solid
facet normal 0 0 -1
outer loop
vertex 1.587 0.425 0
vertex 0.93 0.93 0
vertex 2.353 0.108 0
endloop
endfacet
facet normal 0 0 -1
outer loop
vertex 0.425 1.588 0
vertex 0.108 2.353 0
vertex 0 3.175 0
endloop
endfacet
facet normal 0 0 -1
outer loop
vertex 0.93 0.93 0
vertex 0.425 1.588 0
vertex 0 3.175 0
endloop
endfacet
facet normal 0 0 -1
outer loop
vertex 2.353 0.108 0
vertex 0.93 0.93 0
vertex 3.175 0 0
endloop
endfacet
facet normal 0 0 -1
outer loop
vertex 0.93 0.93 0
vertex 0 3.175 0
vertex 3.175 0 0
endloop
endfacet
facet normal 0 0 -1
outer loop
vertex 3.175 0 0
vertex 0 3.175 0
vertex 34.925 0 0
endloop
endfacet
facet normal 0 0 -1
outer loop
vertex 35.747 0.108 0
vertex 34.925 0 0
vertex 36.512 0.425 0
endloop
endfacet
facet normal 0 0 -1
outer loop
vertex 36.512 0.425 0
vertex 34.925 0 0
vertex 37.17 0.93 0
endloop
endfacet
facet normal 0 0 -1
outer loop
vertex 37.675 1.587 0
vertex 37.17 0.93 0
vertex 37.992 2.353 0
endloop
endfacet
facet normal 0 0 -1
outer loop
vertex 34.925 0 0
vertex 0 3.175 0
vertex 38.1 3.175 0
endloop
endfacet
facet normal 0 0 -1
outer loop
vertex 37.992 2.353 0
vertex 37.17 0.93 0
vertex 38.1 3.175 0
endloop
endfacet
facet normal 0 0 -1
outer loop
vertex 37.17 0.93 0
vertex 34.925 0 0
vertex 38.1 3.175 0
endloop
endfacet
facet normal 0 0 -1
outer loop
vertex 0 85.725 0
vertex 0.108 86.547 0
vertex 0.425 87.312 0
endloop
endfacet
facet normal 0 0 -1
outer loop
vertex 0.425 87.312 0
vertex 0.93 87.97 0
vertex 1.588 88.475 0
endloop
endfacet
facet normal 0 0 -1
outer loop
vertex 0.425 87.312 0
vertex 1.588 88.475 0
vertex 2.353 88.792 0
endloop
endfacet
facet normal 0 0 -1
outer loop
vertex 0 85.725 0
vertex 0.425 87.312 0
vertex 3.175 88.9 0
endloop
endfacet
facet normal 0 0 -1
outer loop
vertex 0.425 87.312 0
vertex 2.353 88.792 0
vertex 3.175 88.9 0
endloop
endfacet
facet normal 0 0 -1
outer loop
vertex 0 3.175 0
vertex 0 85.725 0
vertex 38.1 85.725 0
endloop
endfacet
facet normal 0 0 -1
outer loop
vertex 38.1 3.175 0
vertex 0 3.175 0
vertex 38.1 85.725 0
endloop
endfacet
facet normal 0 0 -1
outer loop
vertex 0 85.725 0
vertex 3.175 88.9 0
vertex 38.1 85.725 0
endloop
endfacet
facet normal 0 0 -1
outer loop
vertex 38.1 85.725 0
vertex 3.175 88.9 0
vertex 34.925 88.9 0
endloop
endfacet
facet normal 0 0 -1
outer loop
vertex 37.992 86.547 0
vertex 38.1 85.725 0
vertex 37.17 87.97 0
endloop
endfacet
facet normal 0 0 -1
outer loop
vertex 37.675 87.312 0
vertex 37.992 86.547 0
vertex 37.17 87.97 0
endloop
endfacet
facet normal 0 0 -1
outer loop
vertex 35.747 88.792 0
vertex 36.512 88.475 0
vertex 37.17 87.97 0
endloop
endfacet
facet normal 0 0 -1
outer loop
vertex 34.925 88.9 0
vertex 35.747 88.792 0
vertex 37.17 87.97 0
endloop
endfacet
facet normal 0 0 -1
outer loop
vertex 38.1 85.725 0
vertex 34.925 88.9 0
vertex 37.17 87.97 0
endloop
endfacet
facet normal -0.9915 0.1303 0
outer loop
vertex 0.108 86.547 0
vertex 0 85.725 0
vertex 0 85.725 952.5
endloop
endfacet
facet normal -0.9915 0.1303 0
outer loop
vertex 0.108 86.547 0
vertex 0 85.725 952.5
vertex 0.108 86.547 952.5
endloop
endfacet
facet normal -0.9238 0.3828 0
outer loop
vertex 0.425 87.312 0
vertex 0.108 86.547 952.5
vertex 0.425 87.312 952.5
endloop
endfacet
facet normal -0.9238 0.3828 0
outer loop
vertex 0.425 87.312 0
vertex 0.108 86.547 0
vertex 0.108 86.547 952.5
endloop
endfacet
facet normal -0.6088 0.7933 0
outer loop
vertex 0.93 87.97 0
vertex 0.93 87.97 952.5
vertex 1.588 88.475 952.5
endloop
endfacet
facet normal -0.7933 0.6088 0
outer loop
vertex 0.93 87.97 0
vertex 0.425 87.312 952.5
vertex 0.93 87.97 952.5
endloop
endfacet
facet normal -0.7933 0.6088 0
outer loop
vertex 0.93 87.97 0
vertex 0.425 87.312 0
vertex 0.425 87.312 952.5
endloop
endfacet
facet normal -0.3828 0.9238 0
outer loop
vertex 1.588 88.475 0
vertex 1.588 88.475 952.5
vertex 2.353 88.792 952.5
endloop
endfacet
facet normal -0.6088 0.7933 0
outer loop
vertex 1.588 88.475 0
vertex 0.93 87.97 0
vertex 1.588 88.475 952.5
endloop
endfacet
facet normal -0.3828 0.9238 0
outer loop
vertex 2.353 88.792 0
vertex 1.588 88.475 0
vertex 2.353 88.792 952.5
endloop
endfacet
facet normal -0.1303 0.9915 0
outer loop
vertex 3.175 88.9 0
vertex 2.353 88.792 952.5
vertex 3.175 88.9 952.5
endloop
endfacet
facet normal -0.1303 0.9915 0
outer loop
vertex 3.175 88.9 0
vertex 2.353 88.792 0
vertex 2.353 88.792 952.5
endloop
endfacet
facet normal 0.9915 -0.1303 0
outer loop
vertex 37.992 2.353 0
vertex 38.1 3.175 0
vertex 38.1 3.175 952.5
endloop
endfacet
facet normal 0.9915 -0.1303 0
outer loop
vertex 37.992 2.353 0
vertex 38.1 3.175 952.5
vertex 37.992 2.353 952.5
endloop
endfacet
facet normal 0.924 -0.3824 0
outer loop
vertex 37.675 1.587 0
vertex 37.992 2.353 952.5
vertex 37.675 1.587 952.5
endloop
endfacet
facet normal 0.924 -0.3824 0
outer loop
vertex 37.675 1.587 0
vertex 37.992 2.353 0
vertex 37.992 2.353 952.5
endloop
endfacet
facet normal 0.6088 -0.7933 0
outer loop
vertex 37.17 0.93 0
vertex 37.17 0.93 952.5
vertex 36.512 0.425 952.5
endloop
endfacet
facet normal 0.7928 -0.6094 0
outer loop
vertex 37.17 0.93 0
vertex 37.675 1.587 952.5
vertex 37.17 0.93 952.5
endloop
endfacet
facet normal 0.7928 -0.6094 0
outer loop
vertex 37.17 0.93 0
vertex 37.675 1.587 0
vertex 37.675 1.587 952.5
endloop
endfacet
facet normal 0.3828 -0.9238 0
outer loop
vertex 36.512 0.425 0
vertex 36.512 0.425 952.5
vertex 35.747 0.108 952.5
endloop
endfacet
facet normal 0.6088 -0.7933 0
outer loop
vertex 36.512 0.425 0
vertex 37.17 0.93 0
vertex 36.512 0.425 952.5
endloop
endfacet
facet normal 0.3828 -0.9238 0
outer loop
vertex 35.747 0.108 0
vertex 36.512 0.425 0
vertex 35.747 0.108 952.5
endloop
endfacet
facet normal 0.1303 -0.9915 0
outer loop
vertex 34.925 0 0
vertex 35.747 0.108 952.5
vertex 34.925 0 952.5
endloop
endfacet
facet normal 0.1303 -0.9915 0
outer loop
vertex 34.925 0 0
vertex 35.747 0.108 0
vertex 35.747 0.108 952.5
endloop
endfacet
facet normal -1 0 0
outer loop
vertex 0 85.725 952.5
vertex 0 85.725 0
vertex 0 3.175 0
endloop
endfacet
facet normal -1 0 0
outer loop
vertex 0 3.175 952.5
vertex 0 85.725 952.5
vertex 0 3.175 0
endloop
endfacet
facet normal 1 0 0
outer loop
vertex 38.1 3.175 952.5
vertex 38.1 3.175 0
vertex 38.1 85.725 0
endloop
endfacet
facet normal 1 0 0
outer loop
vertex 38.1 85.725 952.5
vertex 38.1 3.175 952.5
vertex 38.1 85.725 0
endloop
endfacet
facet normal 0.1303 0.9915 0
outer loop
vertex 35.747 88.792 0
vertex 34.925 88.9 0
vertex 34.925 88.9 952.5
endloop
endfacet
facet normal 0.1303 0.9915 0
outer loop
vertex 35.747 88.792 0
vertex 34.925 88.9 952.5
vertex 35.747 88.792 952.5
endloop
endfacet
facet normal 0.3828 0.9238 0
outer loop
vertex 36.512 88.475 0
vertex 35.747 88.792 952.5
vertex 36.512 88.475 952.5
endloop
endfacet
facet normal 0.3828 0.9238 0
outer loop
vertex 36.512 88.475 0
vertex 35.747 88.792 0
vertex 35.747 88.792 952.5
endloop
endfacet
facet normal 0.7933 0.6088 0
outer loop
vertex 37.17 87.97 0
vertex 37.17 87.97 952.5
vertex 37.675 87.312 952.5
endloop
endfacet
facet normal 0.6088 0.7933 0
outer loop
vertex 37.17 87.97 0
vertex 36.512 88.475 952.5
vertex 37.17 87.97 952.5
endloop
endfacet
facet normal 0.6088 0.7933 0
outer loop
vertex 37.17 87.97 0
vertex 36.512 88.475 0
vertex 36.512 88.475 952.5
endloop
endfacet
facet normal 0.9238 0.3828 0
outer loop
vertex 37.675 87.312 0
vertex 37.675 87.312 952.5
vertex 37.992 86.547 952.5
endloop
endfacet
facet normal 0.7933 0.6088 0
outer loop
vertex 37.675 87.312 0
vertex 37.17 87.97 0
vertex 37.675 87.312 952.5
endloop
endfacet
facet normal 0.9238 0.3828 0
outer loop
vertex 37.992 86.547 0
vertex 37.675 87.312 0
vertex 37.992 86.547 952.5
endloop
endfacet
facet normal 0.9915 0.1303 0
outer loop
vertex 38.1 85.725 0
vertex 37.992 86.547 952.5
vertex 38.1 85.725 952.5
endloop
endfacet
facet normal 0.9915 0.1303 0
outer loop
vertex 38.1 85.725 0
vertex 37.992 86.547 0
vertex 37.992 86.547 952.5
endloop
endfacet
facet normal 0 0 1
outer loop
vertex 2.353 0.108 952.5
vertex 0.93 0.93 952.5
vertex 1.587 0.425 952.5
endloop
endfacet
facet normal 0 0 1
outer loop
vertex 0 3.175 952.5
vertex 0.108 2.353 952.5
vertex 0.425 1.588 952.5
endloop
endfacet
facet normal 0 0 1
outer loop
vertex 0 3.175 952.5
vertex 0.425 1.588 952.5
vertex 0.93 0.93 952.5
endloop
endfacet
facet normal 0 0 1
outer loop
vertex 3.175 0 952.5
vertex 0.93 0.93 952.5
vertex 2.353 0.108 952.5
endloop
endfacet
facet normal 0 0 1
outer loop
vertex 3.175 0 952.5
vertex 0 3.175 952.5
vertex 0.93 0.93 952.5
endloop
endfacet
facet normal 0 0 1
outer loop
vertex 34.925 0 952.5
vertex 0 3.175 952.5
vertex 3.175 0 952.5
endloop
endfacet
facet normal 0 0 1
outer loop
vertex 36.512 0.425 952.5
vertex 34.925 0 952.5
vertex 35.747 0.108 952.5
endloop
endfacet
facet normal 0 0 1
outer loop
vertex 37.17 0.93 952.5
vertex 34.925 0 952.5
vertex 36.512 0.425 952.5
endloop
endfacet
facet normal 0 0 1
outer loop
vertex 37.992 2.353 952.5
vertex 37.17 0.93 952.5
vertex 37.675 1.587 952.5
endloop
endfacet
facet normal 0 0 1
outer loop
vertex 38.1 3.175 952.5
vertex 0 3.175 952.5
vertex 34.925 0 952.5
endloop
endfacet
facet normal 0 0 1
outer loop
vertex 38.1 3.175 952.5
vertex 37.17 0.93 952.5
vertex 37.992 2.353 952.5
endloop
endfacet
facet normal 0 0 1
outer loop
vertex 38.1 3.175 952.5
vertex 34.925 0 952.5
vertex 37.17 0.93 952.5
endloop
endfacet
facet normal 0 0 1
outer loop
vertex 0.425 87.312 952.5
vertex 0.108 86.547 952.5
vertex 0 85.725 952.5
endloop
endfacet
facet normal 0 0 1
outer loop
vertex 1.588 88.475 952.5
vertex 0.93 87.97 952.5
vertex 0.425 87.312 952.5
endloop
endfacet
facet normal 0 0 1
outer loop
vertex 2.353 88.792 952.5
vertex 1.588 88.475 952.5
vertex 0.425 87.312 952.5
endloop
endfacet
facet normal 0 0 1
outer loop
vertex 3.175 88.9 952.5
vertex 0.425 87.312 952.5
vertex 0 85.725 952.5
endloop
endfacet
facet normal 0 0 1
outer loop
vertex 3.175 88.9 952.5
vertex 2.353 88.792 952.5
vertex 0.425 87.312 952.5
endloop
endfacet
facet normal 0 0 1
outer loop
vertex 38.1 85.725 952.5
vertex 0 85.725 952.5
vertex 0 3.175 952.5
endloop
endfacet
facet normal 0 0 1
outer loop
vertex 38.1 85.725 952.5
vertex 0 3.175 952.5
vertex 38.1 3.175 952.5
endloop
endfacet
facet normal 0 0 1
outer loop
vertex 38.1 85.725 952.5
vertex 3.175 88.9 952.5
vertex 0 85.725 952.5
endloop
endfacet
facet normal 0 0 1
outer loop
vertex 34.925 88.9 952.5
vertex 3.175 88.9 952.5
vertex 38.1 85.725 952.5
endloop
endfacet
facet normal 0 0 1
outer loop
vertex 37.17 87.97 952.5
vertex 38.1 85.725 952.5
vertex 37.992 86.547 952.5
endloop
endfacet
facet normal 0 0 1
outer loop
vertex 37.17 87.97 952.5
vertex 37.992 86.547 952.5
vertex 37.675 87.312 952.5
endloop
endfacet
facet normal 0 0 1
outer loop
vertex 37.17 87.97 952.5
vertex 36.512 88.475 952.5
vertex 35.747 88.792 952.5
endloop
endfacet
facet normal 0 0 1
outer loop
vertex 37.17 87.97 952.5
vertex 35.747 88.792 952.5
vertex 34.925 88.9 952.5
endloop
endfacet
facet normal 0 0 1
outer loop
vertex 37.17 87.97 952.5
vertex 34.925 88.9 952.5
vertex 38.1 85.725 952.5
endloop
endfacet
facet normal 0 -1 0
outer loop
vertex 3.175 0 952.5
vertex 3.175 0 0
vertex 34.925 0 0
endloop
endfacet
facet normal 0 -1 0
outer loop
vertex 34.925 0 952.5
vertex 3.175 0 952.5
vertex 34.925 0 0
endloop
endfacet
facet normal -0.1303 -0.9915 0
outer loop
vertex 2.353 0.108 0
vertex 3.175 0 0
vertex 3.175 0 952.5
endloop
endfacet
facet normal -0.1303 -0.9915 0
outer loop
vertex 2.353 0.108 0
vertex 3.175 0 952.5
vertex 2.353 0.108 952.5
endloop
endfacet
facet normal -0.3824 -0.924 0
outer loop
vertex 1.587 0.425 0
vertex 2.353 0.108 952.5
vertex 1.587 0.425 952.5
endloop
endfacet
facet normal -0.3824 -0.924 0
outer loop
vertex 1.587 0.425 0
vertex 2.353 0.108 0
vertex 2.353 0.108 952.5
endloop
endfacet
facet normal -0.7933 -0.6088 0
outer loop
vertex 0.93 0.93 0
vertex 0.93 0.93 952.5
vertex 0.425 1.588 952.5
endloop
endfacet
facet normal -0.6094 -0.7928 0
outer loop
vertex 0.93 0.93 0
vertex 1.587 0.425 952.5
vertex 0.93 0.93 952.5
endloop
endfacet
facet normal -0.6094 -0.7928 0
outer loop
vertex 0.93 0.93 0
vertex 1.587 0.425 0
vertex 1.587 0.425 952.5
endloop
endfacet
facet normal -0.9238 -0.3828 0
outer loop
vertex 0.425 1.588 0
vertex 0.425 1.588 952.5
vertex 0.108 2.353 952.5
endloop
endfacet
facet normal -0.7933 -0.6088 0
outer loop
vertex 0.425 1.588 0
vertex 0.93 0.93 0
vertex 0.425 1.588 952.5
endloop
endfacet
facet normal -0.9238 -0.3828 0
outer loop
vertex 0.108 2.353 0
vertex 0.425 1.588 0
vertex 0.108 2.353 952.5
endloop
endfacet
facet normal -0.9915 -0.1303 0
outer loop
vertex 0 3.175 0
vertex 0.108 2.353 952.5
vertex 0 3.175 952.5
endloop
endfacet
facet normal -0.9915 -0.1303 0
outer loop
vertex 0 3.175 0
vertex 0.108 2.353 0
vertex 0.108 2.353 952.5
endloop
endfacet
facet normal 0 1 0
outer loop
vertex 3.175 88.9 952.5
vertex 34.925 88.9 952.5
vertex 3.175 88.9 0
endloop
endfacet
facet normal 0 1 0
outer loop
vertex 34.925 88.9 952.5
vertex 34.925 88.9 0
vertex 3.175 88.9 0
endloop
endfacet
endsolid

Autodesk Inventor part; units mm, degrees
ref_plane "YZ Plane" through (0, 0, 0) normal (1, 0, 0) x (0, 1, 0)
ref_plane "XZ Plane" through (0, 0, 0) normal (0, 1, 0) x (-1, 0, 0)
ref_plane "XY Plane" through (0, 0, 0) normal (0, 0, 1) x (1, 0, 0)
sketch "Sketch1" plane through (0, 0, 0) normal (0, 0, 1) x (1, 0, 0)
  line L0 (3.175, 0) -> (34.925, 0)
  line L1 (38.1, 3.175) -> (38.1, 85.725)
  line L2 (34.925, 88.9) -> (3.175, 88.9)
  line L3 (0, 85.725) -> (0, 3.175)
  arc A0 (3.175, 88.9) -> (0, 85.725) centre (3.175, 85.725) ccw
  arc A1 (0, 3.175) -> (3.175, 0) centre (3.175, 3.175) ccw
  arc A2 (34.925, 0) -> (38.1, 3.175) centre (34.925, 3.175) ccw
  arc A3 (38.1, 85.725) -> (34.925, 88.9) centre (34.925, 85.725) ccw
  point P0 (0, 0)
  point P1 (38.1, 88.9)
  point P2 (0, 88.9)
  dimension "d0" = 88.9
  dimension "d1" = 38.1
  dimension "d2" = 3.175
extrude "Extrusion1" add sketch "Sketch1" along normal blind 952.5
properties part number "GE-12103-03"
